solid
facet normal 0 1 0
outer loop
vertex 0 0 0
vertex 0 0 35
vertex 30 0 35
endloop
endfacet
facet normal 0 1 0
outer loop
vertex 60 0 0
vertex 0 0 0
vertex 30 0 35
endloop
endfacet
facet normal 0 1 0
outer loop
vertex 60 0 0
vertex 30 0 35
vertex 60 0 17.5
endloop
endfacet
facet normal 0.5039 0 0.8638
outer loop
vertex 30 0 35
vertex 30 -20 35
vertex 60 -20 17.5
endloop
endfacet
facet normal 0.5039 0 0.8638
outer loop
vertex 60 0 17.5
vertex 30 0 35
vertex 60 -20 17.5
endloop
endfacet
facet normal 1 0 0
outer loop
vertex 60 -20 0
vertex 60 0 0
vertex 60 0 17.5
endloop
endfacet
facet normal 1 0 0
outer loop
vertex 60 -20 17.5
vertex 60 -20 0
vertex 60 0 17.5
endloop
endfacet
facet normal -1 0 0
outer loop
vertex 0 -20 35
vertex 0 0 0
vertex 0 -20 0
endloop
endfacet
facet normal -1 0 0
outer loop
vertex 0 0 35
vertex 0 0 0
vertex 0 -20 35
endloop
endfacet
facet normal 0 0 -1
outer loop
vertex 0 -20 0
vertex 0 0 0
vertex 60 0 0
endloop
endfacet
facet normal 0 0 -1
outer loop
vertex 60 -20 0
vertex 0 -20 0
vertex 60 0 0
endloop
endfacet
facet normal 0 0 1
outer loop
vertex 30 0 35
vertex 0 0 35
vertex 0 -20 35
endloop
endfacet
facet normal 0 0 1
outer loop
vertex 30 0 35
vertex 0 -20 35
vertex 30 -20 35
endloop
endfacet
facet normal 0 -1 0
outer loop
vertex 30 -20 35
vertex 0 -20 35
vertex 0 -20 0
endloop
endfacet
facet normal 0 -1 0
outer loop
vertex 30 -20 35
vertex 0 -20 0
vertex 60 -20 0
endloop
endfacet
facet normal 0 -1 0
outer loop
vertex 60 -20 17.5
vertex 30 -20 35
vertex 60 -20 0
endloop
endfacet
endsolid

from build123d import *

# Parameters (mm, degrees)
F0_W     = 60
F0_H     = 35
F1_DEPTH = 20
F3_DEPTH = 25


# Not quite as in the source:
# - a feature names something its author has since deleted; it is built from what else it names


with BuildPart() as f1:
    # F0 (on Front) → F1 (new body)
    with BuildSketch(Plane.XZ):
        with Locations((30, 17.5)):
            Rectangle(F0_W, F0_H)
    extrude(amount=F1_DEPTH)

    # F2 (on face) → F3 (cut)
    with BuildSketch(Plane.XZ.offset(20)):
        Polygon((60, 35), (30, 35), (60, 17.5), align=None)
    extrude(amount=-F3_DEPTH, mode=Mode.SUBTRACT)


solid = f1.part
